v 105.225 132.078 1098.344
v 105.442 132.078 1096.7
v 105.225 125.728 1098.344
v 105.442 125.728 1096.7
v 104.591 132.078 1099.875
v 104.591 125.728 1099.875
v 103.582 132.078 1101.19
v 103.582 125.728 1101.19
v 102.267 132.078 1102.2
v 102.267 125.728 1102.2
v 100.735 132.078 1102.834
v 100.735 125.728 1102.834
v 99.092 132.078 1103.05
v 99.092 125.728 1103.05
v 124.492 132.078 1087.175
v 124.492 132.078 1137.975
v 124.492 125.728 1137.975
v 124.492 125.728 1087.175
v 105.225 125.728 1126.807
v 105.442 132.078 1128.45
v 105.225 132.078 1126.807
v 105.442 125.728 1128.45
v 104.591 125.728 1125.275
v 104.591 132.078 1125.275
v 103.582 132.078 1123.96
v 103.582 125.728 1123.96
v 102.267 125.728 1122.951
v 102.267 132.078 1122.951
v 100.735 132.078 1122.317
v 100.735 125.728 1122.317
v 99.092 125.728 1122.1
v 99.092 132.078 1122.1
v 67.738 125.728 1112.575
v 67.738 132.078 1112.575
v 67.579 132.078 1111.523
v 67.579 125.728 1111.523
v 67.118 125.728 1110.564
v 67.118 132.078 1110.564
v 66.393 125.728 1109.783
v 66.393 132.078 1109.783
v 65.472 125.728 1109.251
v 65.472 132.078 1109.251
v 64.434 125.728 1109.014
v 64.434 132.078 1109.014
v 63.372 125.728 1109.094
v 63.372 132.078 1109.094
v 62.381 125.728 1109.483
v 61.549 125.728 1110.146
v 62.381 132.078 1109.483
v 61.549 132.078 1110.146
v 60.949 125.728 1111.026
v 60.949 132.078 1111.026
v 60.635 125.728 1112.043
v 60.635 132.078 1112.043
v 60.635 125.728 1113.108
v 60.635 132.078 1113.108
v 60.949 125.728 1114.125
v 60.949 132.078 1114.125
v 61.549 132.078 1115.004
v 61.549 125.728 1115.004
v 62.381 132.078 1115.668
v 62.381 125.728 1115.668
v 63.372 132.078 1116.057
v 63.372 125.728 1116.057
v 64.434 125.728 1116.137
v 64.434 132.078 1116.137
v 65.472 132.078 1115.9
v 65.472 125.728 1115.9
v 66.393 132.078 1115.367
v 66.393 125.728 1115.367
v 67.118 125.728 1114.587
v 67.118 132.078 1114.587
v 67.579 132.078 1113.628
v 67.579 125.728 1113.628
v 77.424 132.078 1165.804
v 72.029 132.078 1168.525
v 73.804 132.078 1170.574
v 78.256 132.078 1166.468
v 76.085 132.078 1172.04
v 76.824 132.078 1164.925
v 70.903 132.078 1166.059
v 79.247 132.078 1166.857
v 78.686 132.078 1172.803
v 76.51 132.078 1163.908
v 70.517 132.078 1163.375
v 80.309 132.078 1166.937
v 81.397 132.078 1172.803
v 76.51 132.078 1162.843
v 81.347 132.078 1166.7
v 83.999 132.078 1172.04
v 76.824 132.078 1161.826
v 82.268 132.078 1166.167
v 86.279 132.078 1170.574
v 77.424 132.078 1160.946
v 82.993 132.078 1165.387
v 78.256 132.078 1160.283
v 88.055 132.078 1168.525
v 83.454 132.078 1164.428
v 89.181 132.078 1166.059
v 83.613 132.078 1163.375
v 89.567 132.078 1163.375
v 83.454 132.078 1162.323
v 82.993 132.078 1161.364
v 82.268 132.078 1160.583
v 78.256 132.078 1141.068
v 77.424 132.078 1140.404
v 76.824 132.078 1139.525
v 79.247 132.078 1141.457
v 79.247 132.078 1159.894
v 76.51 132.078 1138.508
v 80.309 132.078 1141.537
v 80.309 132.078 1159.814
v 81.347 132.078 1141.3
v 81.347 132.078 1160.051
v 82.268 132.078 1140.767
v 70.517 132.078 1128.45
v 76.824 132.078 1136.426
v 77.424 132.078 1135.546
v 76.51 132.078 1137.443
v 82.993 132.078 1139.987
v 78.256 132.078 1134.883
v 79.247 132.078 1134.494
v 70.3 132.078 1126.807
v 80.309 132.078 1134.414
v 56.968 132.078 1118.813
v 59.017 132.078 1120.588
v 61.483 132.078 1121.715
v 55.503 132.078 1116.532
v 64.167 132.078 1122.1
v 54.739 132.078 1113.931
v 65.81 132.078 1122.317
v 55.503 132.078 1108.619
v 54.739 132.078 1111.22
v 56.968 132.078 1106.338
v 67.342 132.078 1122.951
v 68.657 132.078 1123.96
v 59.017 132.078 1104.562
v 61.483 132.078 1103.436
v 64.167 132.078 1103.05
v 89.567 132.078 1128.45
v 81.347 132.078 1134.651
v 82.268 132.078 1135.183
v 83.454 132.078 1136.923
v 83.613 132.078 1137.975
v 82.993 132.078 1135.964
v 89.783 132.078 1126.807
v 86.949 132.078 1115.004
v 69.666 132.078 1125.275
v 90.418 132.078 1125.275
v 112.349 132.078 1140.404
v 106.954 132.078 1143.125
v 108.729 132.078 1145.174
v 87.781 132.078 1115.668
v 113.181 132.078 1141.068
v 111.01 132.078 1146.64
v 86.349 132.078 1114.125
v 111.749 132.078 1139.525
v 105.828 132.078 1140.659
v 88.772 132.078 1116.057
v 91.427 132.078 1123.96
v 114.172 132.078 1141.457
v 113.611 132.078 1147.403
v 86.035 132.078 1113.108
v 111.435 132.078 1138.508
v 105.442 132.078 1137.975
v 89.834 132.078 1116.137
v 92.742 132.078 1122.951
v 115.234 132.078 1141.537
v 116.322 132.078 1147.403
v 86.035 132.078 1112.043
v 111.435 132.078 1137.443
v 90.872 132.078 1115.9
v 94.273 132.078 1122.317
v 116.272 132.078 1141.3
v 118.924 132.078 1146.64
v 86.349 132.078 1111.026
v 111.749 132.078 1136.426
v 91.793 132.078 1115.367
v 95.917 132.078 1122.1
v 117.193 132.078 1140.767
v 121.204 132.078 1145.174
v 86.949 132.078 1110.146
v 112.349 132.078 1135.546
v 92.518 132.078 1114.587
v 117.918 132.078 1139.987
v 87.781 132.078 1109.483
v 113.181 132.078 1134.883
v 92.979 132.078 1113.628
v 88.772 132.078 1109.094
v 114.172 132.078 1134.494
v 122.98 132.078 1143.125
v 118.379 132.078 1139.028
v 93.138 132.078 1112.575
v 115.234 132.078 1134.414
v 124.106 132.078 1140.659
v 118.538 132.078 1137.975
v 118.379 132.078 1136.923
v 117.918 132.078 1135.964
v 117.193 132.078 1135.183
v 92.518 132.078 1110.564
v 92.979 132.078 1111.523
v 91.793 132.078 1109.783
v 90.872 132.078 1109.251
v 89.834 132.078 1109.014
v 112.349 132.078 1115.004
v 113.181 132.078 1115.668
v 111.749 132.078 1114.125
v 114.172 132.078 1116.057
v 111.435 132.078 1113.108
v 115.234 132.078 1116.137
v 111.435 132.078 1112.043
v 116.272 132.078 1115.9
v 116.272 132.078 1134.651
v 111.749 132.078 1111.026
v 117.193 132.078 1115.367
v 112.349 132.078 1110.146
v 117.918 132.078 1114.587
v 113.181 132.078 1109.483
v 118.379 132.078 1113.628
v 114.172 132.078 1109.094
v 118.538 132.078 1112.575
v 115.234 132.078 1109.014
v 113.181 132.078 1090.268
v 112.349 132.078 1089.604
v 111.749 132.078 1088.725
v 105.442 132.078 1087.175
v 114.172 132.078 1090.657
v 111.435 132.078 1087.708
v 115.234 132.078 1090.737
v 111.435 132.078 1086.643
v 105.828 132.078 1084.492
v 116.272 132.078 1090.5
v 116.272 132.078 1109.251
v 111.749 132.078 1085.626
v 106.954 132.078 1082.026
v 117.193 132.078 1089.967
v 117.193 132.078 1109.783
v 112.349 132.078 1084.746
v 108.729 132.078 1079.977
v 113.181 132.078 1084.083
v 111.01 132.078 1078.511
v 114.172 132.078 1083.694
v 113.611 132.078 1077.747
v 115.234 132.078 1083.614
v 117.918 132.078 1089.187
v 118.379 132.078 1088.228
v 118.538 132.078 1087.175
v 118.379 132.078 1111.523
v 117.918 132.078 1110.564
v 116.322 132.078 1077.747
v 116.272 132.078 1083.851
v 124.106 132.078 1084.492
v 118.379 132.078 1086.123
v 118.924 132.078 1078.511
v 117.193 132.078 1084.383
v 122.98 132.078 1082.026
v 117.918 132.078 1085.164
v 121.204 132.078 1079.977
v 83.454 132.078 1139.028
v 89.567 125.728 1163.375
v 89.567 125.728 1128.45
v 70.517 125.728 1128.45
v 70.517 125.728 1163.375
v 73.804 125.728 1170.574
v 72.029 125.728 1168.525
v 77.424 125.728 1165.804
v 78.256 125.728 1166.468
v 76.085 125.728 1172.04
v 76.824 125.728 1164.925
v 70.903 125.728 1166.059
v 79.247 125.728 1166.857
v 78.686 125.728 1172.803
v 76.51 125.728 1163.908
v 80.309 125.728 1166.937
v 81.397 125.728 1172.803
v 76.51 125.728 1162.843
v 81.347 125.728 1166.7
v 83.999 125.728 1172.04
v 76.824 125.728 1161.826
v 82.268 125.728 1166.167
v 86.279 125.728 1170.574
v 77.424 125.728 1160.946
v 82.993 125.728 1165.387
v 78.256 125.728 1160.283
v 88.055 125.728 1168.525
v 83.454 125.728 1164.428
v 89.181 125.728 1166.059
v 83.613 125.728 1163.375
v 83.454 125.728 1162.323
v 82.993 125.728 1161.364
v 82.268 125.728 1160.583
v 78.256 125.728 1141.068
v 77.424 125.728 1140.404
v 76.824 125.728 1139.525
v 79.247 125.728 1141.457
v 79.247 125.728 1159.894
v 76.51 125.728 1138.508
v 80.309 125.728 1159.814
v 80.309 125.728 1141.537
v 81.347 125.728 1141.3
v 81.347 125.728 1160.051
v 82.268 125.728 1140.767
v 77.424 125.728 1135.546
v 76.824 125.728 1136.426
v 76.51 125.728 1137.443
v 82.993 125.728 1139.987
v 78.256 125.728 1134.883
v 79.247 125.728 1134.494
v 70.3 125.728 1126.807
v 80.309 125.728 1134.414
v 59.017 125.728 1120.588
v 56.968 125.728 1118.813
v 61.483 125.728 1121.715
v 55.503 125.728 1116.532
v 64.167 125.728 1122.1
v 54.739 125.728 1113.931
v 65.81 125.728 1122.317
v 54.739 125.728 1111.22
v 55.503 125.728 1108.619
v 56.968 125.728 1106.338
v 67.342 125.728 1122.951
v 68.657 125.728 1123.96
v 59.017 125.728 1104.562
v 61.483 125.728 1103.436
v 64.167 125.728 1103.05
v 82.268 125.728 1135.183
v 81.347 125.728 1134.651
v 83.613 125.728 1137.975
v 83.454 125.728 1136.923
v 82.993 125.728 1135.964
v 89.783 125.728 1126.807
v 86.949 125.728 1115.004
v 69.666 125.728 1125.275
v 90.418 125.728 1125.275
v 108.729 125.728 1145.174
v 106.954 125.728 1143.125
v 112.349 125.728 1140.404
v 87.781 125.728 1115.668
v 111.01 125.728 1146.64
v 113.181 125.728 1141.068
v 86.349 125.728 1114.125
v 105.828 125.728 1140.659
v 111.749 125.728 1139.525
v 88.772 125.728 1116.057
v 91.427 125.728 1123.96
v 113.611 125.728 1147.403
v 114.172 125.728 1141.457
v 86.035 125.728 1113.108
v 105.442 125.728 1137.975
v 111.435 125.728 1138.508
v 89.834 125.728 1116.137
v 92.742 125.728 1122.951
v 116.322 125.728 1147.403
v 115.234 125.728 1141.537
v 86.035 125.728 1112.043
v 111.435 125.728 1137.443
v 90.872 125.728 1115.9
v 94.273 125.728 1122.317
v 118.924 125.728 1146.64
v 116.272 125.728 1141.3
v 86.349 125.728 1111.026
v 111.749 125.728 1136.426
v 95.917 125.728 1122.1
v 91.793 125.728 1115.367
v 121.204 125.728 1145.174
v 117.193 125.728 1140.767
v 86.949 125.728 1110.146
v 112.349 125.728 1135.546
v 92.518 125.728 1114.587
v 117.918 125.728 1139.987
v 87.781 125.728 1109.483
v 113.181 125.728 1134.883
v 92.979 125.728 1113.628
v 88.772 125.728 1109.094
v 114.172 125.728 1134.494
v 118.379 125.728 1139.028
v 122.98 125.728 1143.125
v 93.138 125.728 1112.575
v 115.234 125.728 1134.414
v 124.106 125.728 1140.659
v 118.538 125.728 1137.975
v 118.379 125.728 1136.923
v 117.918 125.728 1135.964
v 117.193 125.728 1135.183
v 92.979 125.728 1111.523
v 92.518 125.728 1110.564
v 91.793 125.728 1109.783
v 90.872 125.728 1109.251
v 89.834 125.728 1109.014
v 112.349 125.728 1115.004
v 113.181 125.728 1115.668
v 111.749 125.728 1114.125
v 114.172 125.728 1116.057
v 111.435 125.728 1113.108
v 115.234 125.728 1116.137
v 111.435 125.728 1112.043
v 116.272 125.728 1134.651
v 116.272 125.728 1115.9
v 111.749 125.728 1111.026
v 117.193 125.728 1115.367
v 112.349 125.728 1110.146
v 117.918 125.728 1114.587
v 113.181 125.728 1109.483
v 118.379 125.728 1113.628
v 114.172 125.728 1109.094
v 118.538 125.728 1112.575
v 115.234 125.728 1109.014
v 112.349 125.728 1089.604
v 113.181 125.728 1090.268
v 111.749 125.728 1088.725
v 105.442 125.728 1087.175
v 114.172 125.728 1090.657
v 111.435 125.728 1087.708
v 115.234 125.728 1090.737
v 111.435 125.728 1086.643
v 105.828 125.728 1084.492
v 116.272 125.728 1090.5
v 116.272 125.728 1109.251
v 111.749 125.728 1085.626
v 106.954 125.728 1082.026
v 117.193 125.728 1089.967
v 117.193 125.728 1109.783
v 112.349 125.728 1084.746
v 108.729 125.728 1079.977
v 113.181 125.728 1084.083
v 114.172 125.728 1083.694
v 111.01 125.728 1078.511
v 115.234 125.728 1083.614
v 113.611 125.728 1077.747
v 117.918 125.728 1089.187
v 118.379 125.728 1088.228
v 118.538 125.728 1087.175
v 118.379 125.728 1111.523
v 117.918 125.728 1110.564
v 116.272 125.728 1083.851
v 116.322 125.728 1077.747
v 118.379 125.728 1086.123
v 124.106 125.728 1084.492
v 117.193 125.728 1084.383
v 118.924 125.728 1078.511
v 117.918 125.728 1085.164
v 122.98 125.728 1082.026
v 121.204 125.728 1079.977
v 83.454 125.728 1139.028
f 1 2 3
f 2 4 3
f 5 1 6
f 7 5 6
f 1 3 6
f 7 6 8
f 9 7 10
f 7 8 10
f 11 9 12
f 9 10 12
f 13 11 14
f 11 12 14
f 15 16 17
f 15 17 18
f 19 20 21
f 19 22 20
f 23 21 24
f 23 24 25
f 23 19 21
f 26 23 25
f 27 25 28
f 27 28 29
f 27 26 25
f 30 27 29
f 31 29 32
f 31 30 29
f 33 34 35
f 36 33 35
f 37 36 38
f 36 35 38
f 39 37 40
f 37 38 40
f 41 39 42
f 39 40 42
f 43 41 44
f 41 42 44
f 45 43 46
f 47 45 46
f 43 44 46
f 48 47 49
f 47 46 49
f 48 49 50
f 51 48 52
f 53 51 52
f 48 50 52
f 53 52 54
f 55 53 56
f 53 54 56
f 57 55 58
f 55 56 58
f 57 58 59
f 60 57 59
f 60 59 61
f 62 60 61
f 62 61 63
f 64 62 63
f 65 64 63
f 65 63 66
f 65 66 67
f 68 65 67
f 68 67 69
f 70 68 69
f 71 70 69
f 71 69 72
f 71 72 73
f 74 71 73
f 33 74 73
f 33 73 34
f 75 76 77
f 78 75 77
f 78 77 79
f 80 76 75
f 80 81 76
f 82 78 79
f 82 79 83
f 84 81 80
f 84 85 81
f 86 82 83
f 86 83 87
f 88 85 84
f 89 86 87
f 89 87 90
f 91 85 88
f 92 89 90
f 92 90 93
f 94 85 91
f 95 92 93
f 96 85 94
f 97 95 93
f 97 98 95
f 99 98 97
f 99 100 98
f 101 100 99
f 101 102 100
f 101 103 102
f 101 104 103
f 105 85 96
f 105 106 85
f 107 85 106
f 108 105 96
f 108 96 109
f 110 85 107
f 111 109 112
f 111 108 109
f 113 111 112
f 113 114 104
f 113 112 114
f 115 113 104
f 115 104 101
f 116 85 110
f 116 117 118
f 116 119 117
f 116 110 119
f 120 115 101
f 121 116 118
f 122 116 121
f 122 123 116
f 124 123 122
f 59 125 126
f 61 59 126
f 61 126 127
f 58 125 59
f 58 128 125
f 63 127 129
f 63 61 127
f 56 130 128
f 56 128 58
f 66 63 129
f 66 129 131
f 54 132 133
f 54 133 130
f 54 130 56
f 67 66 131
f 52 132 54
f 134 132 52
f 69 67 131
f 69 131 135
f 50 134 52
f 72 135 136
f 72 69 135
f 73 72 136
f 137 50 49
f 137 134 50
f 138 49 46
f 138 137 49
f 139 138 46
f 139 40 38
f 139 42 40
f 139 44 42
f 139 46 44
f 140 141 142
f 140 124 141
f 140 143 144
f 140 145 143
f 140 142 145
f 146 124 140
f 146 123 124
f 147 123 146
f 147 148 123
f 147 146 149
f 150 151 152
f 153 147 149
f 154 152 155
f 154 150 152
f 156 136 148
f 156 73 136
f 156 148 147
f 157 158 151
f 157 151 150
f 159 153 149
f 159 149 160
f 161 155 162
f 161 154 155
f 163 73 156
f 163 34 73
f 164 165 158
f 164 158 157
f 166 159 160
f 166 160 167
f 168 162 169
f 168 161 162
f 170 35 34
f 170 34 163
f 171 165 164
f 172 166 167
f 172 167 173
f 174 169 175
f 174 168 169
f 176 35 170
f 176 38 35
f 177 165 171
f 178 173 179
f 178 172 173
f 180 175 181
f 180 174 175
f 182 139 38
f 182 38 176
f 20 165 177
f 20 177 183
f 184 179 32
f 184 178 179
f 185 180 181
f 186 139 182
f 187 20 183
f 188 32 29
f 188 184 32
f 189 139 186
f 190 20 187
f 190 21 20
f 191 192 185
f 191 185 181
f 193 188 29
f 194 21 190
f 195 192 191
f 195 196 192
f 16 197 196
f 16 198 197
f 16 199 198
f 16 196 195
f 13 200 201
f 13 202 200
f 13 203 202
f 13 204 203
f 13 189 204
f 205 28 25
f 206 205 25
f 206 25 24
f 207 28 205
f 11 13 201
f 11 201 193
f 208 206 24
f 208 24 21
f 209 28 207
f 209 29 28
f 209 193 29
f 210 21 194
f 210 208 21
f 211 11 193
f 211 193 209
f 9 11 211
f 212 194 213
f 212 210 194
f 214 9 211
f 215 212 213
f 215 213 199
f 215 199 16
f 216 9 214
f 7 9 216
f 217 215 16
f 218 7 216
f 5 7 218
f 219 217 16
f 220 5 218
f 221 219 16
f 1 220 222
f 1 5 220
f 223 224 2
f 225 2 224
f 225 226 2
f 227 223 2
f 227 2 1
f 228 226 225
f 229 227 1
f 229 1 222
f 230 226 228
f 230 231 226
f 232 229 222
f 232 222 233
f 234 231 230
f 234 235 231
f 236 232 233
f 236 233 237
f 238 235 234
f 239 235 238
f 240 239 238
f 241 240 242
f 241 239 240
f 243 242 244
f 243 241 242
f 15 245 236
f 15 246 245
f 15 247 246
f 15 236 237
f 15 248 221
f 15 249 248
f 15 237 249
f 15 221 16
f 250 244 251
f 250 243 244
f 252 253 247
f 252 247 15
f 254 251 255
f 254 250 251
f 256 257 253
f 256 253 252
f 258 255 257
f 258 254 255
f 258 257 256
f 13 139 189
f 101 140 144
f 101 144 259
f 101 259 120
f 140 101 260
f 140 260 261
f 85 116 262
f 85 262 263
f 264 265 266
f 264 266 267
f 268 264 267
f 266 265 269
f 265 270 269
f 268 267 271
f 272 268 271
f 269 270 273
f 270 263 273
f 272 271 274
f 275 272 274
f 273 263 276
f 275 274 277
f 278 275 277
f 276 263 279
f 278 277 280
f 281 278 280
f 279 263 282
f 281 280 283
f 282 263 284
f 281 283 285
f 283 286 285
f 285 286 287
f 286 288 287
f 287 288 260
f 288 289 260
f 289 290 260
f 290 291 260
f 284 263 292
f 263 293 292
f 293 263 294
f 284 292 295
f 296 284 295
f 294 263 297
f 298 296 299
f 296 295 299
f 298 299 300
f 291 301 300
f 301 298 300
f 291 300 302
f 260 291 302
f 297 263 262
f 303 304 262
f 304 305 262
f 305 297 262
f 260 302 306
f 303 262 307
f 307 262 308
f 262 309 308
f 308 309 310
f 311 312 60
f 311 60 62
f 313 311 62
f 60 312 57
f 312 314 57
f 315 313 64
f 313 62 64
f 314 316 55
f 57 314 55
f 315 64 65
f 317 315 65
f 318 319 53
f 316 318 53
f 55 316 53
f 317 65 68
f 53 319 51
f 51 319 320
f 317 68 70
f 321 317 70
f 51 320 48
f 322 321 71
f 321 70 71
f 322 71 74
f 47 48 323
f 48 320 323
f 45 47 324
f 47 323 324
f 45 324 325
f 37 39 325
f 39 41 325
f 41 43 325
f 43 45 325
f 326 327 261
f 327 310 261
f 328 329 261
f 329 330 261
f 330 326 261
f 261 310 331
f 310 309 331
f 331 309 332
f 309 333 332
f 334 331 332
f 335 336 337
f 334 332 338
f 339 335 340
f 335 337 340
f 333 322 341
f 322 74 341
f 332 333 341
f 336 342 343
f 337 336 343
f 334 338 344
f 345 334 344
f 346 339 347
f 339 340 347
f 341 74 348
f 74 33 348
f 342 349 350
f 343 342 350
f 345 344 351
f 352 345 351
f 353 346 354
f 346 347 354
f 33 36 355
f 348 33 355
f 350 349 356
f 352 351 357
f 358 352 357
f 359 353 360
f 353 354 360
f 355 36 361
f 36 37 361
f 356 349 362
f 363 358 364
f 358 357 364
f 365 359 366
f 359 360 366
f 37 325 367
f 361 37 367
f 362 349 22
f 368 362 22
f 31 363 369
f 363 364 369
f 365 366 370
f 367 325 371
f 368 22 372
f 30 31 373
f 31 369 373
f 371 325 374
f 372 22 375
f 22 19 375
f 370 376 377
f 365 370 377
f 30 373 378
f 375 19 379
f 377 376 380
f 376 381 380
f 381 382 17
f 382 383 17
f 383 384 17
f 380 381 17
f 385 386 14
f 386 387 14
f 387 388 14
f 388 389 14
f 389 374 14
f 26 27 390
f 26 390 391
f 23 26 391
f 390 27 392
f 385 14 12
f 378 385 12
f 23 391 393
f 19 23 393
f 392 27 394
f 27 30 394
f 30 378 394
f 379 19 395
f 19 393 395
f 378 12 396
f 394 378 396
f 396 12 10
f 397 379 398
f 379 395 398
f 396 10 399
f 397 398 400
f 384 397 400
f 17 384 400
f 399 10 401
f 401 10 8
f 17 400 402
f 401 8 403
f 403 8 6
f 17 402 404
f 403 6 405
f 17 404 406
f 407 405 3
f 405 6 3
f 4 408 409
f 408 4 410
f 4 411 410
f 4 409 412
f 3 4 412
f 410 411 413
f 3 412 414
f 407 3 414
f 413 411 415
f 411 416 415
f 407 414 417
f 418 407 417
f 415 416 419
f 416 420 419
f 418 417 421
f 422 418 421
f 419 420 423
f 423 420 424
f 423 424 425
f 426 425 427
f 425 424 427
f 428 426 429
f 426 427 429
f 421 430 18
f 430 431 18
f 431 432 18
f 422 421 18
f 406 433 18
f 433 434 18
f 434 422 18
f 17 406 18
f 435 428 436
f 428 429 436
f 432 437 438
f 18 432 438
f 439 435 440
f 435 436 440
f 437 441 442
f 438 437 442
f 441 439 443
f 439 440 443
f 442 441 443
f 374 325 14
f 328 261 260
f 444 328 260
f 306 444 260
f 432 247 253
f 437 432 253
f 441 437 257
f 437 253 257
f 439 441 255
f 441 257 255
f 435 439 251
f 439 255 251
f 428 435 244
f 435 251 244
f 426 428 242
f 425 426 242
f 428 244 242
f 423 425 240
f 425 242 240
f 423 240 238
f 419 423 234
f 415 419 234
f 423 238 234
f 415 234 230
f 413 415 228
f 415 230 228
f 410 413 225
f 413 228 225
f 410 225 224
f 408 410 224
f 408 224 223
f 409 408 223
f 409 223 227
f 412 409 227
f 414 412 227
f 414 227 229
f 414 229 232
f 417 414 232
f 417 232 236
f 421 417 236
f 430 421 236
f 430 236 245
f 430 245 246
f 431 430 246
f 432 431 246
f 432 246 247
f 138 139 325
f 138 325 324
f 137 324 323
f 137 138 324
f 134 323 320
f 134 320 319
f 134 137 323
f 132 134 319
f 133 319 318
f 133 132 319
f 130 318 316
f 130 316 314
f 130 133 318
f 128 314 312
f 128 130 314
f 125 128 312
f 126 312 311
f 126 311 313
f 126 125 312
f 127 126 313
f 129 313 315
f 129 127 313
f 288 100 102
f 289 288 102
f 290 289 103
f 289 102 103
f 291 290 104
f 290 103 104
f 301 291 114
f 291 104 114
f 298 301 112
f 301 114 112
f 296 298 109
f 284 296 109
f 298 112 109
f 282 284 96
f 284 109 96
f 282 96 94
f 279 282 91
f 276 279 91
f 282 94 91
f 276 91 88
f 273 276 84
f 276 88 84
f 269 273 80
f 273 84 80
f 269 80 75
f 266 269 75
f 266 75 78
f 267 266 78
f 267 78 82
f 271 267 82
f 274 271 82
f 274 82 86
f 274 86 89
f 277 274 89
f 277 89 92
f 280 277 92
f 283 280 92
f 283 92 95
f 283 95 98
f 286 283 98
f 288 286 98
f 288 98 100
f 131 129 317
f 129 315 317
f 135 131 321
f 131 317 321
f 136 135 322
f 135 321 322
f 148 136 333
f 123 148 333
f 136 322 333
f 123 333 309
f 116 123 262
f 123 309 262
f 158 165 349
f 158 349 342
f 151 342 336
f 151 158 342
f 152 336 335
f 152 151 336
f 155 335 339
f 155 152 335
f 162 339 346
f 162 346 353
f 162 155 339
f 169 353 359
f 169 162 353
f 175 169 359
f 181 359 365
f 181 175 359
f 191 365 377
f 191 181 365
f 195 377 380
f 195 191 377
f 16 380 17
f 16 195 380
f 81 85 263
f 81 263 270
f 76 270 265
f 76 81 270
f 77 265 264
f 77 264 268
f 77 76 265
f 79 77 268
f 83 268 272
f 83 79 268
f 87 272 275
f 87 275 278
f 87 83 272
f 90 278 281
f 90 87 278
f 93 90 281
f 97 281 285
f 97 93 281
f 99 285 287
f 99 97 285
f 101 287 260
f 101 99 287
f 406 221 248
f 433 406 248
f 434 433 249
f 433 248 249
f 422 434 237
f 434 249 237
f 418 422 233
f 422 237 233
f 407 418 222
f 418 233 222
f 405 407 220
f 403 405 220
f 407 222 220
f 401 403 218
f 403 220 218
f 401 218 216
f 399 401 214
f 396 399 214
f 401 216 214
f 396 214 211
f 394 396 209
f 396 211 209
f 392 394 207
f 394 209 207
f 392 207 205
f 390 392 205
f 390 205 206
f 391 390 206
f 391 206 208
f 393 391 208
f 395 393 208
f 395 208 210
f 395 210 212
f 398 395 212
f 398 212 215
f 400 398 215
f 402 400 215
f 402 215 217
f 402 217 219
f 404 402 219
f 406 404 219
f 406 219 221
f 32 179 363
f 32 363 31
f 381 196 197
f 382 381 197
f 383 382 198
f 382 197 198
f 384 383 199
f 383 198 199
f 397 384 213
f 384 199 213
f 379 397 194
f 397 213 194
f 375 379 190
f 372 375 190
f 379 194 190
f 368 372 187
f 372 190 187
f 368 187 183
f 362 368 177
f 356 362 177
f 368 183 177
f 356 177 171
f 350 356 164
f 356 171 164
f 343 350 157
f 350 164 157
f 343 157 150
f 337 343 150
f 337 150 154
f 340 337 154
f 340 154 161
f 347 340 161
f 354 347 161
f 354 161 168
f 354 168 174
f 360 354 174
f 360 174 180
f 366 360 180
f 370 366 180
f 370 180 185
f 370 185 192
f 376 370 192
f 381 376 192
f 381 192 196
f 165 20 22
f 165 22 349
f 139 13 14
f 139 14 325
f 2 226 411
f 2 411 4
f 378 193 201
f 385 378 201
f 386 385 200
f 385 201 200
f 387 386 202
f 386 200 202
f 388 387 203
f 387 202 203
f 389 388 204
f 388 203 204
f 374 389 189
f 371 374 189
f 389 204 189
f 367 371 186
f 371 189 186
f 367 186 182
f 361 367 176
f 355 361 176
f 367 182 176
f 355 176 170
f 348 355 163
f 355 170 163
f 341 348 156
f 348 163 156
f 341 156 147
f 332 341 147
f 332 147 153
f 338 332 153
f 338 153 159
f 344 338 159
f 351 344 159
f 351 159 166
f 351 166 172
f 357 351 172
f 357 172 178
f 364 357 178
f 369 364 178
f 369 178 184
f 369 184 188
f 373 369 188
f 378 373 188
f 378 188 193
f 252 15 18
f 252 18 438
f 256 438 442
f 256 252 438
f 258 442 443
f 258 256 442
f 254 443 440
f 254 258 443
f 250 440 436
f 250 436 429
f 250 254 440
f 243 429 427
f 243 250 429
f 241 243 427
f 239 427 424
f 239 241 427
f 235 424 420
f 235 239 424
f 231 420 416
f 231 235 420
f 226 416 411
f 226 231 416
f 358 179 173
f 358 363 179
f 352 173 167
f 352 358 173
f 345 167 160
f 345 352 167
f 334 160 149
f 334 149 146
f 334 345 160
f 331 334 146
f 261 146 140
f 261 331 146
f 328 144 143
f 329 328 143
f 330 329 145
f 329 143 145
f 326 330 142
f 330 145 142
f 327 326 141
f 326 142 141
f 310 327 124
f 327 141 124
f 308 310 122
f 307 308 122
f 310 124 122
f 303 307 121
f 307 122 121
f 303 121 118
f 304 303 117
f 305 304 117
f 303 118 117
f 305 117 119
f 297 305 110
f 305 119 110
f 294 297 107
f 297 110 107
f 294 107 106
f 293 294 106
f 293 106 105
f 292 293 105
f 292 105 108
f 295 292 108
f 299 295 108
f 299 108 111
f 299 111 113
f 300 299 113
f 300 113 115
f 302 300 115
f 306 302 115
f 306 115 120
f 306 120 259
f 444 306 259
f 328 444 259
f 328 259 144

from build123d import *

# Parameters (mm, degrees)
BOSS_EXTRUDE2_START     = 12.827
BOSS_EXTRUDE2_DEPTH     = 6.35
F_1_4_CLEARANCE_HOLE2_D = 7.14248
FILLET2_R               = 6.35


with BuildPart() as part:
    # Sketch5 → Boss-Extrude2 (new body)
    with BuildSketch(Plane(origin=(0, 144.904574554, 0), x_dir=(-1, 0, 0), z_dir=(0, -1, 0)).offset(BOSS_EXTRUDE2_START)):
        with BuildLine():
            Line((-124.491812484, -1137.975334154), (-124.491812484, -1087.175334154))
            ThreePointArc((-124.491812484, -1087.175334154), (-114.966812484, -1077.650334154), (-105.441812484, -1087.175334154))
            Line((-105.441812484, -1087.175334154), (-105.441812484, -1103.050334154))
            Line((-105.441812484, -1103.050334154), (-64.166812484, -1103.050334154))
            ThreePointArc((-64.166812484, -1103.050334154), (-54.641812484, -1112.575334154), (-64.166812484, -1122.100334154))
            Line((-64.166812484, -1122.100334154), (-70.516812484, -1122.100334154))
            Line((-70.516812484, -1122.100334154), (-70.516812484, -1163.375334154))
            ThreePointArc((-70.516812484, -1163.375334154), (-80.041812484, -1172.900334154), (-89.566812484, -1163.375334154))
            Line((-89.566812484, -1163.375334154), (-89.566812484, -1122.100334154))
            Line((-89.566812484, -1122.100334154), (-105.441812484, -1122.100334154))
            Line((-105.441812484, -1122.100334154), (-105.441812484, -1137.975334154))
            ThreePointArc((-105.441812484, -1137.975334154), (-114.966812484, -1147.500334154), (-124.491812484, -1137.975334154))
        make_face()
    extrude(amount=BOSS_EXTRUDE2_DEPTH)

    # 1/4 Clearance Hole2 (through all)
    with Locations(Plane(origin=(0, 125.727574554, 0), x_dir=(-1, 0, 0), z_dir=(0, -1, 0))):
        with Locations((-114.966812484, -1087.175334154), (-114.966812484, -1137.975334154), (-114.966812484, -1112.575334154), (-89.566812484, -1112.575334154), (-64.166812484, -1112.575334154), (-80.041812484, -1137.975334154), (-80.041812484, -1163.375334154)):
            Hole(F_1_4_CLEARANCE_HOLE2_D / 2)

    # Fillet2
    fillet2_edges = [part.edges().sort_by_distance(p)[0] for p in [
        (105.441812484, 128.902574554, 1103.050334154),
        (70.516812484, 128.902574554, 1122.100334154),
        (89.566812484, 128.902574554, 1122.100334154),
        (105.441812484, 128.902574554, 1122.100334154),
    ]]
    fillet(fillet2_edges, radius=FILLET2_R - 0.0001)  # a hair under: the kernel refuses the full size


solid = part.part
